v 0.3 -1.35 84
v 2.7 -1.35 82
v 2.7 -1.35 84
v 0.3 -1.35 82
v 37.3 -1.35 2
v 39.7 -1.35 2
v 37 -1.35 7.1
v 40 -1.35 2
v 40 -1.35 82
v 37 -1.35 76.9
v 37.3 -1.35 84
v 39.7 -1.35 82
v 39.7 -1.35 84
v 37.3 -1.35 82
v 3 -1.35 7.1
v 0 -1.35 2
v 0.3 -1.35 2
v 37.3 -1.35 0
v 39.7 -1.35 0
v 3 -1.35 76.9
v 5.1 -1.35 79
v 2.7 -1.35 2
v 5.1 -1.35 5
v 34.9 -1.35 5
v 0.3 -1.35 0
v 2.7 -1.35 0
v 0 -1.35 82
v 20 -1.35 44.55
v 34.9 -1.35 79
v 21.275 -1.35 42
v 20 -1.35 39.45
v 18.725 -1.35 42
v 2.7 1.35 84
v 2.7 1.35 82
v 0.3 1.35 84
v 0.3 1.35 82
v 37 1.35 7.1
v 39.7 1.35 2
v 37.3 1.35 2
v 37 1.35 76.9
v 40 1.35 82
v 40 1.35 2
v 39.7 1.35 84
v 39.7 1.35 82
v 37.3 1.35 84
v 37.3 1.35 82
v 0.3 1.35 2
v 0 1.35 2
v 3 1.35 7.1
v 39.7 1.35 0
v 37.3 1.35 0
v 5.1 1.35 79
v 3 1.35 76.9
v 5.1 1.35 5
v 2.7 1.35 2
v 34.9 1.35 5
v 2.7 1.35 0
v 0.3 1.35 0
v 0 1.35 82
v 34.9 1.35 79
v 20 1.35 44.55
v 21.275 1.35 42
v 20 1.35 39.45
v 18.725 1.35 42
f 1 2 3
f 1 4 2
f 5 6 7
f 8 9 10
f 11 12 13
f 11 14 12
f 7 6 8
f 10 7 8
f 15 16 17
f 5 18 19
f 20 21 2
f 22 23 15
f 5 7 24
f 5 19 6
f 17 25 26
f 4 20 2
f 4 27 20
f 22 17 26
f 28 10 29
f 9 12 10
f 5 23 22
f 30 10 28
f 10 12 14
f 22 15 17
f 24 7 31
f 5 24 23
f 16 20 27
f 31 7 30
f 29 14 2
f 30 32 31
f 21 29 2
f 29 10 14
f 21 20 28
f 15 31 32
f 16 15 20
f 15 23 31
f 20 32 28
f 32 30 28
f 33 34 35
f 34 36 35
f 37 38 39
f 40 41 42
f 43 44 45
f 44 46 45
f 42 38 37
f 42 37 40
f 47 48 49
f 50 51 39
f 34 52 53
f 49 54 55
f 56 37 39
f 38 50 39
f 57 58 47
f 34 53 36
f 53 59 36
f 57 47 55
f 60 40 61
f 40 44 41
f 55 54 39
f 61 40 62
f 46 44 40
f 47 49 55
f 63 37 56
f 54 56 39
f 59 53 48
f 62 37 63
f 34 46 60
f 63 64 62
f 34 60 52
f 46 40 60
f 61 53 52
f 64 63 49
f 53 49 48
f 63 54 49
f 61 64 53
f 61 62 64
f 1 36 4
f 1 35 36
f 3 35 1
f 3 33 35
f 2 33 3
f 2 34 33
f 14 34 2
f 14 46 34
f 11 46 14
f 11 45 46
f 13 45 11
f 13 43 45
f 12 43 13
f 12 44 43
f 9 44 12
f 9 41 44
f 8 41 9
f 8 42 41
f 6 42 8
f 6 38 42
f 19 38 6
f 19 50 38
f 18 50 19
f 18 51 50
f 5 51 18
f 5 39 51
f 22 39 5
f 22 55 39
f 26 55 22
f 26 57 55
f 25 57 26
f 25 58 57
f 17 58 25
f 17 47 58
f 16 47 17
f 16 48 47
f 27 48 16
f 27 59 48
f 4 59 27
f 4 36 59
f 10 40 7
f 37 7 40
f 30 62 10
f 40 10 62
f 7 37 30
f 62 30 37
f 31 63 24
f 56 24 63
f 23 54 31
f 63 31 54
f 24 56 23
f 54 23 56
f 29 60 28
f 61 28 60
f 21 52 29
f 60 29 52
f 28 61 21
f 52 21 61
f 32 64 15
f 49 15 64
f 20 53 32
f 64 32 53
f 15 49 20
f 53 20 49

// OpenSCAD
module support(h=2, sup = 80, th=3, gap=0.3){

    delta = 1.7*th;

    p1 = [0,0];
    p2 = [sup,0];
	
	p21 = [sup,gap];
	p22 = [sup+h,gap];
	p23 = [sup+h,th-gap];
	p24 = [sup,th-gap];
	
	p25 = [sup,sup/2-th+gap];
	p26 = [sup+h,sup/2-th+gap];
	p27 = [sup+h,sup/2-gap];
	p28 = [sup,sup/2-gap];

    p3 = [sup,sup/2];
    
	p4 = [0,sup/2];
	
	p41 = [0,sup/2-gap];
	p42 = [-h,sup/2-gap];
	p43 = [-h,sup/2-th+gap];
	p44 = [0,sup/2-th+gap];
	
	p45 = [0,th-gap];
	p46 = [-h,th-gap];
	p47 = [-h,gap];
	p48 = [0,gap];
	
	
    p5 = [th,delta];
    p6 = [th,sup/2-delta];
    p7 = [(sup-delta)/2,sup/4];
	
    p8 = [sup-th,sup/2-delta];
    p9 = [sup-th,delta];
    p10 = [(sup+delta)/2,sup/4];
	
    p11 = [delta,th];
    p12 = [sup-delta,th];
    p13 = [sup/2,(sup-delta)/4];
	
    p14 = [delta,sup/2-th];
    p15 = [sup-delta,sup/2-th];
    p16 = [sup/2,(sup+delta)/4];

	outer  = [p1,p2, p21,p22,p23,p24, p25,p26,p27,p28, p3,p4, p41,p42,p43,p44, p45,p46,p47,p48];
	outerN = [0,1,2,3,4,5,6,7,8,9,10,11, 12,13,14,15, 16,17,18,19];
	
	inner1  = [p5,p6,p7];
	inner1N = [20,21,22];
	
	inner2  = [p8,p9,p10];
	inner2N = [23,24,25];
	
	inner3  = [p11,p12,p13];
	inner3N = [26,27,28];
	
	inner4  = [p14,p15,p16];
	inner4N = [29,30,31];

	all = concat(outer, inner1, inner2, inner3, inner4);

	translate([0,-th/2+gap/2,h]){
		rotate(a=-90,v=[0,0,1]){
			rotate(a=-90,v=[0,1,0]){
				linear_extrude(th-gap){
					polygon(
						all,
					    [outerN,inner1N,inner2N,inner3N,inner4N]
					);
				}
			}
		}
	}	    

}

support();
